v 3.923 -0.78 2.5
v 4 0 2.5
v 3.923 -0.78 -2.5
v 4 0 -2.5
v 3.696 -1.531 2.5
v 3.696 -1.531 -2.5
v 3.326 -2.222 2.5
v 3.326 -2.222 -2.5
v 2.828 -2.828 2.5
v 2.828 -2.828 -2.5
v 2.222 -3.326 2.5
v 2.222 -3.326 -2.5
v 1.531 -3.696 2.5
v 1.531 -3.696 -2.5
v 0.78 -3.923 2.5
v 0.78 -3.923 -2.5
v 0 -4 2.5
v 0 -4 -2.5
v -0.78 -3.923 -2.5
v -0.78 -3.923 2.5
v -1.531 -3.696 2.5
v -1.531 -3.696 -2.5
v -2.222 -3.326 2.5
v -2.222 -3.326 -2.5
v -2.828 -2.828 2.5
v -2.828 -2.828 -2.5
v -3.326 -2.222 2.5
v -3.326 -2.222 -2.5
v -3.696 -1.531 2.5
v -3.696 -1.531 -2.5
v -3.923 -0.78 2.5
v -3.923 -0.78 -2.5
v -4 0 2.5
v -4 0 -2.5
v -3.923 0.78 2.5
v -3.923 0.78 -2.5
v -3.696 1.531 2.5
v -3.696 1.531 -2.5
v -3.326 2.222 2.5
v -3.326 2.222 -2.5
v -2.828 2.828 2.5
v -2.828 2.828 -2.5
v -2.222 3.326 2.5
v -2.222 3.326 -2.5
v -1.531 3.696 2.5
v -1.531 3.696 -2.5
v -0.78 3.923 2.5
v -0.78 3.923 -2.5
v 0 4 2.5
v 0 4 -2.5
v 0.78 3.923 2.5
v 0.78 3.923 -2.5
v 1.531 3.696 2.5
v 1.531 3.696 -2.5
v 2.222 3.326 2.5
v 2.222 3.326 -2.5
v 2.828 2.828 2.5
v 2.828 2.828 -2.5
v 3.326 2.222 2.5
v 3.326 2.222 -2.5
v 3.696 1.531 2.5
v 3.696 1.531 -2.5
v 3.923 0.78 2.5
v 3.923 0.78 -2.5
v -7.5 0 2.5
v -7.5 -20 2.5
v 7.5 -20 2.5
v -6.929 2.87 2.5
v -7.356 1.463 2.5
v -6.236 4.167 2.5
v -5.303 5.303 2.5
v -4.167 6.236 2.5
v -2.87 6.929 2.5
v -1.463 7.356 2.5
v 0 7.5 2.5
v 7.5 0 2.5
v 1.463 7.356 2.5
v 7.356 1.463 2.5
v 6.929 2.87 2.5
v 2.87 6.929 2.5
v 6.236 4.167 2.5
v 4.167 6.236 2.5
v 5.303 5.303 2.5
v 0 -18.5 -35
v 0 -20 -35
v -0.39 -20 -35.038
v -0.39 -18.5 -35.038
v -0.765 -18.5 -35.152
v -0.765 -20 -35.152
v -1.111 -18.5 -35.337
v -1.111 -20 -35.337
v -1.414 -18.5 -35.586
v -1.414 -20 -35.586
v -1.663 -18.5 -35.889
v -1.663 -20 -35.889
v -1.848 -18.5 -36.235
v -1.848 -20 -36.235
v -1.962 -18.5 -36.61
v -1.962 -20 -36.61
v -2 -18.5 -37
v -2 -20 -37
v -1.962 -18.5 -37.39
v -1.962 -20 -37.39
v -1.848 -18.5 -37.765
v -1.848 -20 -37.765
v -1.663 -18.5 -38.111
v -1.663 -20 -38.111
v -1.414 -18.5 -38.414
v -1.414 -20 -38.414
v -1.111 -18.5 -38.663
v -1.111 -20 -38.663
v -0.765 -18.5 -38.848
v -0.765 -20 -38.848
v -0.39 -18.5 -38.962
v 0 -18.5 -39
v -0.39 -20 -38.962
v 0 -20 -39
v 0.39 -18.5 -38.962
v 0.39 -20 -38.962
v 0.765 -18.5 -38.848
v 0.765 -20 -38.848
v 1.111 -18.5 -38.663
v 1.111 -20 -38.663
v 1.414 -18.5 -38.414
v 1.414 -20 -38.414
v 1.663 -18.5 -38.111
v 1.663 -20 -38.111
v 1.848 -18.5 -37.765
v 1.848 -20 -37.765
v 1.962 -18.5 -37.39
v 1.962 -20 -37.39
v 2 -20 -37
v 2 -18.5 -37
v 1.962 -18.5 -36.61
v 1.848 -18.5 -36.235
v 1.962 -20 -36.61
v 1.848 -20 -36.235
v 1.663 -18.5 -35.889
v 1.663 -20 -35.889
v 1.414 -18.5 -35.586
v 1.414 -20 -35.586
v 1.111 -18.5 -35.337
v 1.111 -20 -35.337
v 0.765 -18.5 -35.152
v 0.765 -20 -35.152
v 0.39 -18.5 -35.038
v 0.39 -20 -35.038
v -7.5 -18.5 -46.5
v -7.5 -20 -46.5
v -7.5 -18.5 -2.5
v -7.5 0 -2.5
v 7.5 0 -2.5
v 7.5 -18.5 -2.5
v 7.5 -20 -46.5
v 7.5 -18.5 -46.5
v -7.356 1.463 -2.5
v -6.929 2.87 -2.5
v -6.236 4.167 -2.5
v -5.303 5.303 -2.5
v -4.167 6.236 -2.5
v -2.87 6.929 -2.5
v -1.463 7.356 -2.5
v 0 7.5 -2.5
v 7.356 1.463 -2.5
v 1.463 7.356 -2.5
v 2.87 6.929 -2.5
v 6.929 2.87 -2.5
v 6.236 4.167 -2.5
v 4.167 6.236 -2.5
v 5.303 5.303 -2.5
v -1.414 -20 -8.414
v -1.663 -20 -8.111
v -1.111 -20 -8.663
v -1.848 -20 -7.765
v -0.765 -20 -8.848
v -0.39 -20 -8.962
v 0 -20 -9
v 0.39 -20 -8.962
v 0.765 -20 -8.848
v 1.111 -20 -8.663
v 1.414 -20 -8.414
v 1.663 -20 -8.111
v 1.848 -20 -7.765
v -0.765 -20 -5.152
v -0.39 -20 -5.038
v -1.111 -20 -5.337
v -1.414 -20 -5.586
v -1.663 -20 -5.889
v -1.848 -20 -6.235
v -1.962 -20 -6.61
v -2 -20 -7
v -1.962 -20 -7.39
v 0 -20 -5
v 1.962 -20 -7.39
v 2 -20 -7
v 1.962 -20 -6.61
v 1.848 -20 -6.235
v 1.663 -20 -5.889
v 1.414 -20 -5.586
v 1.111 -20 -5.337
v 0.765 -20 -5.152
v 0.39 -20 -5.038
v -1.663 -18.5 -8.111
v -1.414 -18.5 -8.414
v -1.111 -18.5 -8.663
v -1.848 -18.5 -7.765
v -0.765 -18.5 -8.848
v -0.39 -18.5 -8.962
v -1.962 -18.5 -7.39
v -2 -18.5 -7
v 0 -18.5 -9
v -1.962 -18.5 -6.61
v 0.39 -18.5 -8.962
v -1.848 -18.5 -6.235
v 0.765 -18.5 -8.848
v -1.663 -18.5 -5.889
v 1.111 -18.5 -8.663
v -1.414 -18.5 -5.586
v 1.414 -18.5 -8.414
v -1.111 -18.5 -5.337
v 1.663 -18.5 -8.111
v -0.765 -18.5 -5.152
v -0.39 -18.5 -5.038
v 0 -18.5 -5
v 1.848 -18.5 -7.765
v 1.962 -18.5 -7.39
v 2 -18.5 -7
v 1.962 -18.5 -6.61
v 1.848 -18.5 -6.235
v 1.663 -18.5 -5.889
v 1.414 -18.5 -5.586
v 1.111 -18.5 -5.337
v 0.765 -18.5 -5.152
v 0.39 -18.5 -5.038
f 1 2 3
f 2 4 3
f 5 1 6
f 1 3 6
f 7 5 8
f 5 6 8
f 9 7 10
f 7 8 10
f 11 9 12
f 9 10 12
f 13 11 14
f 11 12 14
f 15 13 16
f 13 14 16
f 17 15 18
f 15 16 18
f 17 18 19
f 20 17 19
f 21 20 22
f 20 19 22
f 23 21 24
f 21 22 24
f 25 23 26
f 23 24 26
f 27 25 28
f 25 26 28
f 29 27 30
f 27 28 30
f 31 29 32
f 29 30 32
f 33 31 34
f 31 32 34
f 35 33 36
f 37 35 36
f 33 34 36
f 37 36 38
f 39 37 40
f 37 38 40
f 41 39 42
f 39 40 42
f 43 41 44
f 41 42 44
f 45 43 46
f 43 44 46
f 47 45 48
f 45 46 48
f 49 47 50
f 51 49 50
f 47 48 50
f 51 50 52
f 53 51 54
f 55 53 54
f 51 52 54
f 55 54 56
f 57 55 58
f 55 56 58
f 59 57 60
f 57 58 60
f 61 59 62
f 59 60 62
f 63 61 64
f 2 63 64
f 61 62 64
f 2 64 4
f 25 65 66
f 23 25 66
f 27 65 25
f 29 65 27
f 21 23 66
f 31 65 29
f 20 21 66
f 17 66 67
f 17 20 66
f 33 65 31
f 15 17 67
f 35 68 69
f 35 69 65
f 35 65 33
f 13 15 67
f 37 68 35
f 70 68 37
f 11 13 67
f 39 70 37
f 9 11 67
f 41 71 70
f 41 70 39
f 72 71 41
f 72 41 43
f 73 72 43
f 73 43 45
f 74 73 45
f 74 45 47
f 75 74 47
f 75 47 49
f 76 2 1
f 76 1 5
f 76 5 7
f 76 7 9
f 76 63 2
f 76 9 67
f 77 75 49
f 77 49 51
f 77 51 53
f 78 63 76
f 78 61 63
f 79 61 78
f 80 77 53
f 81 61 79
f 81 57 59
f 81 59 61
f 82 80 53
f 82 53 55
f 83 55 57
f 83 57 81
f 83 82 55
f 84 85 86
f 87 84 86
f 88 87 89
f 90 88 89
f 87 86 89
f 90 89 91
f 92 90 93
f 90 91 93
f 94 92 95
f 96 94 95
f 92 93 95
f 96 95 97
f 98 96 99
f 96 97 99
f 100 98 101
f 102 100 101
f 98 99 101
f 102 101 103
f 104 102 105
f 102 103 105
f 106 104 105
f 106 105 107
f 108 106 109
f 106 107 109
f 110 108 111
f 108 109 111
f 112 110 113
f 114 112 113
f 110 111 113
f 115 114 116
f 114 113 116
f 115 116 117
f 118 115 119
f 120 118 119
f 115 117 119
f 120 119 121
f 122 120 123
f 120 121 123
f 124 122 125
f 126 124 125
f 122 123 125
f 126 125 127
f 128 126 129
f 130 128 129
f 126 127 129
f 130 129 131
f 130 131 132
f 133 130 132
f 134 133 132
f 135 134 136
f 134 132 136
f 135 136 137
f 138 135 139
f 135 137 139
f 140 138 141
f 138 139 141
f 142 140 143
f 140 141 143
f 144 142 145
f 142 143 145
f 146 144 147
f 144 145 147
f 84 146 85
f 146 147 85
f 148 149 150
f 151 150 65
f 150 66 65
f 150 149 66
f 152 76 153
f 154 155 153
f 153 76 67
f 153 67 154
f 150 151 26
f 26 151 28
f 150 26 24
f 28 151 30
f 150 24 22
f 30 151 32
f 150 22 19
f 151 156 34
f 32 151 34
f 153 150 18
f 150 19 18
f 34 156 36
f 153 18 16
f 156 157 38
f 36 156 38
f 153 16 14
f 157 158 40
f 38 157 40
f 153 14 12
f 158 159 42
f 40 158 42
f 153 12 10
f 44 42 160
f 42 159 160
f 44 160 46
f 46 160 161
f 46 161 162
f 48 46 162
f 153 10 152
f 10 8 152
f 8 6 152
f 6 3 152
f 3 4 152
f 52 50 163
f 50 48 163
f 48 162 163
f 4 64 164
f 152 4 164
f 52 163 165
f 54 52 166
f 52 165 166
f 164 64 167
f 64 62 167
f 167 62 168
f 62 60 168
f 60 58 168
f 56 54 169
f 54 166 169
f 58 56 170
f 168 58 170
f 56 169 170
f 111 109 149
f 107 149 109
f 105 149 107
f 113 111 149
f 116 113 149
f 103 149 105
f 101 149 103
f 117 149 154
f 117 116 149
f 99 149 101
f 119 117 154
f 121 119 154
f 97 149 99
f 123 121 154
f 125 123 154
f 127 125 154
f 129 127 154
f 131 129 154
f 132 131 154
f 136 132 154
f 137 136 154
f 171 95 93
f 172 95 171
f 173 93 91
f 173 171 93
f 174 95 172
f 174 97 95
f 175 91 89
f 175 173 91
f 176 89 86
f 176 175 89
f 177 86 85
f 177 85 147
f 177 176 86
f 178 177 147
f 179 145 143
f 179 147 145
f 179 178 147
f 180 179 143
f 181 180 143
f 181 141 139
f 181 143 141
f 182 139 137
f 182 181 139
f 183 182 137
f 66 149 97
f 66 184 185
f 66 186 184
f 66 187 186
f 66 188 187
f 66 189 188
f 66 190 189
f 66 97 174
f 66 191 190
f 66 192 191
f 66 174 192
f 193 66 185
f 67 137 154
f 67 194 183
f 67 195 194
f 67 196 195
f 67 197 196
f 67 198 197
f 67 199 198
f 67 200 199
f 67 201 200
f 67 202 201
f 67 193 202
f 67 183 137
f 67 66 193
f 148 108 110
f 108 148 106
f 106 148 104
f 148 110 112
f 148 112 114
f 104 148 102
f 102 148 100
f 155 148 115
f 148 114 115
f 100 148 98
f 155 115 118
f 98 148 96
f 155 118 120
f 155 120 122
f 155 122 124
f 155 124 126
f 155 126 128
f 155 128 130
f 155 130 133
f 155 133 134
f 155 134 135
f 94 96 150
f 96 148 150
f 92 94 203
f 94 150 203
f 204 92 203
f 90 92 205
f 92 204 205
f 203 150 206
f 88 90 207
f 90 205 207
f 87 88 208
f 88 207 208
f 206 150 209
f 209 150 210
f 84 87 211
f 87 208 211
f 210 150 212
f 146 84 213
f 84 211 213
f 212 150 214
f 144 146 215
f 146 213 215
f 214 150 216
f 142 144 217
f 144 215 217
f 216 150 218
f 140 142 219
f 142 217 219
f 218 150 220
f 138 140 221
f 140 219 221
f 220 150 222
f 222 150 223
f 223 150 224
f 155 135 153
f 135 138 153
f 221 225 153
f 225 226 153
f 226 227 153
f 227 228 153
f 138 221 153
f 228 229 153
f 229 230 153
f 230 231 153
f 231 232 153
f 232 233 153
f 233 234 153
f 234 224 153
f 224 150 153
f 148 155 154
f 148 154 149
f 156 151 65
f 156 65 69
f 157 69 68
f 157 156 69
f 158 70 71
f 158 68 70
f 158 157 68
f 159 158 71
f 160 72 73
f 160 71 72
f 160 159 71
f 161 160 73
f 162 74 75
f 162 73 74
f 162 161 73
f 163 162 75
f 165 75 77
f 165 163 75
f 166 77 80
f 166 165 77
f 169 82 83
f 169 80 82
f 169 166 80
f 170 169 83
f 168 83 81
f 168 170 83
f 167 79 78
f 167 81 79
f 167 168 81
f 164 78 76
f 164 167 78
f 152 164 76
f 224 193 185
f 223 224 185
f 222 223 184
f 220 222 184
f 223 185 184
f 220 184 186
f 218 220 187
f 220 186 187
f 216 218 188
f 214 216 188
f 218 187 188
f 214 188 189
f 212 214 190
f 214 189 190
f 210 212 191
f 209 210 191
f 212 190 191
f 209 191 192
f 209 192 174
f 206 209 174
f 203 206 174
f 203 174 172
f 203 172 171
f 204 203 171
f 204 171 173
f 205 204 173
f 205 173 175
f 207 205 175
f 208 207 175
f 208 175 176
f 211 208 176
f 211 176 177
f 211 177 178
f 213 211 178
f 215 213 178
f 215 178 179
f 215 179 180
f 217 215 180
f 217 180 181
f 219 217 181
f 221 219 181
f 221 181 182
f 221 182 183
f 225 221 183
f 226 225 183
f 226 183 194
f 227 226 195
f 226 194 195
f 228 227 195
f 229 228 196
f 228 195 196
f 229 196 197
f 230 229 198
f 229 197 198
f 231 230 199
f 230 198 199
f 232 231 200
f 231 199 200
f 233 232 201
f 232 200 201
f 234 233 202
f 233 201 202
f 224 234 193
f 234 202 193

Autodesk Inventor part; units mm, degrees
ref_plane "YZ Plane" through (0, 0, 0) normal (1, 0, 0) x (0, 1, 0)
ref_plane "XZ Plane" through (0, 0, 0) normal (0, 1, 0) x (-1, 0, 0)
ref_plane "XY Plane" through (0, 0, 0) normal (0, 0, 1) x (1, 0, 0)
sketch "Sketch1" plane through (0, 0, 0) normal (0, 0, 1) x (1, 0, 0)
  circle A0 centre (0, 0) radius 4
  arc A1 (7.5, 0) -> (-7.5, 0) centre (0, 0) ccw
  line L0 (-7.5, 0) -> (7.5, 0)
  line L1 (7.5, 0) -> (7.5, -20)
  line L2 (7.5, -20) -> (-7.5, -20)
  line L3 (-7.5, -20) -> (-7.5, 0)
  dimension "d0" = 8
  dimension "d1" = 15
  dimension "d2" = 15
  dimension "d3" = 20
extrude "Extrusion1" add sketch "Sketch1" along normal mid plane 5 contours L0 L1 L2 L3 A0 | A0 L0 A1
sketch "Sketch2" plane through (0, 0, -2.5) normal (0, 0, -1) x (-1, 0, 0)
  line L0 (7.5, -20) -> (-7.5, -20) projected
  line L1 (-7.5, -20) -> (7.5, -20)
  line L2 (7.5, -20) -> (7.5, -18.5)
  line L3 (7.5, -18.5) -> (-7.5, -18.5)
  line L4 (-7.5, -18.5) -> (-7.5, -20)
  point P0 (0, 0)
  dimension "d6" = 15
  dimension "d7" = 1.5
extrude "Extrusion2" add sketch "Sketch2" along normal blind 44
sketch "Sketch3" plane through (-7.5, -18.5, -2.5) normal (0, 1, 0) x (1, 0, 0)
  line L0 (0, -5) -> (15, -5) projected
  line L1 (7.5, -5) -> (7.5, 4.5)
  line L2 (7.5, 4.5) -> (7.5, 34.5)
  point P0 (7.5, -2.5)
  dimension "d10" = 9.5
  dimension "d11" = 30
hole "Hole1" at (0, -18.5, -7) at (0, -18.5, -37) direction (0, -1, 0) diameter 4 depth 6
properties part number "Half Bearing Block"
